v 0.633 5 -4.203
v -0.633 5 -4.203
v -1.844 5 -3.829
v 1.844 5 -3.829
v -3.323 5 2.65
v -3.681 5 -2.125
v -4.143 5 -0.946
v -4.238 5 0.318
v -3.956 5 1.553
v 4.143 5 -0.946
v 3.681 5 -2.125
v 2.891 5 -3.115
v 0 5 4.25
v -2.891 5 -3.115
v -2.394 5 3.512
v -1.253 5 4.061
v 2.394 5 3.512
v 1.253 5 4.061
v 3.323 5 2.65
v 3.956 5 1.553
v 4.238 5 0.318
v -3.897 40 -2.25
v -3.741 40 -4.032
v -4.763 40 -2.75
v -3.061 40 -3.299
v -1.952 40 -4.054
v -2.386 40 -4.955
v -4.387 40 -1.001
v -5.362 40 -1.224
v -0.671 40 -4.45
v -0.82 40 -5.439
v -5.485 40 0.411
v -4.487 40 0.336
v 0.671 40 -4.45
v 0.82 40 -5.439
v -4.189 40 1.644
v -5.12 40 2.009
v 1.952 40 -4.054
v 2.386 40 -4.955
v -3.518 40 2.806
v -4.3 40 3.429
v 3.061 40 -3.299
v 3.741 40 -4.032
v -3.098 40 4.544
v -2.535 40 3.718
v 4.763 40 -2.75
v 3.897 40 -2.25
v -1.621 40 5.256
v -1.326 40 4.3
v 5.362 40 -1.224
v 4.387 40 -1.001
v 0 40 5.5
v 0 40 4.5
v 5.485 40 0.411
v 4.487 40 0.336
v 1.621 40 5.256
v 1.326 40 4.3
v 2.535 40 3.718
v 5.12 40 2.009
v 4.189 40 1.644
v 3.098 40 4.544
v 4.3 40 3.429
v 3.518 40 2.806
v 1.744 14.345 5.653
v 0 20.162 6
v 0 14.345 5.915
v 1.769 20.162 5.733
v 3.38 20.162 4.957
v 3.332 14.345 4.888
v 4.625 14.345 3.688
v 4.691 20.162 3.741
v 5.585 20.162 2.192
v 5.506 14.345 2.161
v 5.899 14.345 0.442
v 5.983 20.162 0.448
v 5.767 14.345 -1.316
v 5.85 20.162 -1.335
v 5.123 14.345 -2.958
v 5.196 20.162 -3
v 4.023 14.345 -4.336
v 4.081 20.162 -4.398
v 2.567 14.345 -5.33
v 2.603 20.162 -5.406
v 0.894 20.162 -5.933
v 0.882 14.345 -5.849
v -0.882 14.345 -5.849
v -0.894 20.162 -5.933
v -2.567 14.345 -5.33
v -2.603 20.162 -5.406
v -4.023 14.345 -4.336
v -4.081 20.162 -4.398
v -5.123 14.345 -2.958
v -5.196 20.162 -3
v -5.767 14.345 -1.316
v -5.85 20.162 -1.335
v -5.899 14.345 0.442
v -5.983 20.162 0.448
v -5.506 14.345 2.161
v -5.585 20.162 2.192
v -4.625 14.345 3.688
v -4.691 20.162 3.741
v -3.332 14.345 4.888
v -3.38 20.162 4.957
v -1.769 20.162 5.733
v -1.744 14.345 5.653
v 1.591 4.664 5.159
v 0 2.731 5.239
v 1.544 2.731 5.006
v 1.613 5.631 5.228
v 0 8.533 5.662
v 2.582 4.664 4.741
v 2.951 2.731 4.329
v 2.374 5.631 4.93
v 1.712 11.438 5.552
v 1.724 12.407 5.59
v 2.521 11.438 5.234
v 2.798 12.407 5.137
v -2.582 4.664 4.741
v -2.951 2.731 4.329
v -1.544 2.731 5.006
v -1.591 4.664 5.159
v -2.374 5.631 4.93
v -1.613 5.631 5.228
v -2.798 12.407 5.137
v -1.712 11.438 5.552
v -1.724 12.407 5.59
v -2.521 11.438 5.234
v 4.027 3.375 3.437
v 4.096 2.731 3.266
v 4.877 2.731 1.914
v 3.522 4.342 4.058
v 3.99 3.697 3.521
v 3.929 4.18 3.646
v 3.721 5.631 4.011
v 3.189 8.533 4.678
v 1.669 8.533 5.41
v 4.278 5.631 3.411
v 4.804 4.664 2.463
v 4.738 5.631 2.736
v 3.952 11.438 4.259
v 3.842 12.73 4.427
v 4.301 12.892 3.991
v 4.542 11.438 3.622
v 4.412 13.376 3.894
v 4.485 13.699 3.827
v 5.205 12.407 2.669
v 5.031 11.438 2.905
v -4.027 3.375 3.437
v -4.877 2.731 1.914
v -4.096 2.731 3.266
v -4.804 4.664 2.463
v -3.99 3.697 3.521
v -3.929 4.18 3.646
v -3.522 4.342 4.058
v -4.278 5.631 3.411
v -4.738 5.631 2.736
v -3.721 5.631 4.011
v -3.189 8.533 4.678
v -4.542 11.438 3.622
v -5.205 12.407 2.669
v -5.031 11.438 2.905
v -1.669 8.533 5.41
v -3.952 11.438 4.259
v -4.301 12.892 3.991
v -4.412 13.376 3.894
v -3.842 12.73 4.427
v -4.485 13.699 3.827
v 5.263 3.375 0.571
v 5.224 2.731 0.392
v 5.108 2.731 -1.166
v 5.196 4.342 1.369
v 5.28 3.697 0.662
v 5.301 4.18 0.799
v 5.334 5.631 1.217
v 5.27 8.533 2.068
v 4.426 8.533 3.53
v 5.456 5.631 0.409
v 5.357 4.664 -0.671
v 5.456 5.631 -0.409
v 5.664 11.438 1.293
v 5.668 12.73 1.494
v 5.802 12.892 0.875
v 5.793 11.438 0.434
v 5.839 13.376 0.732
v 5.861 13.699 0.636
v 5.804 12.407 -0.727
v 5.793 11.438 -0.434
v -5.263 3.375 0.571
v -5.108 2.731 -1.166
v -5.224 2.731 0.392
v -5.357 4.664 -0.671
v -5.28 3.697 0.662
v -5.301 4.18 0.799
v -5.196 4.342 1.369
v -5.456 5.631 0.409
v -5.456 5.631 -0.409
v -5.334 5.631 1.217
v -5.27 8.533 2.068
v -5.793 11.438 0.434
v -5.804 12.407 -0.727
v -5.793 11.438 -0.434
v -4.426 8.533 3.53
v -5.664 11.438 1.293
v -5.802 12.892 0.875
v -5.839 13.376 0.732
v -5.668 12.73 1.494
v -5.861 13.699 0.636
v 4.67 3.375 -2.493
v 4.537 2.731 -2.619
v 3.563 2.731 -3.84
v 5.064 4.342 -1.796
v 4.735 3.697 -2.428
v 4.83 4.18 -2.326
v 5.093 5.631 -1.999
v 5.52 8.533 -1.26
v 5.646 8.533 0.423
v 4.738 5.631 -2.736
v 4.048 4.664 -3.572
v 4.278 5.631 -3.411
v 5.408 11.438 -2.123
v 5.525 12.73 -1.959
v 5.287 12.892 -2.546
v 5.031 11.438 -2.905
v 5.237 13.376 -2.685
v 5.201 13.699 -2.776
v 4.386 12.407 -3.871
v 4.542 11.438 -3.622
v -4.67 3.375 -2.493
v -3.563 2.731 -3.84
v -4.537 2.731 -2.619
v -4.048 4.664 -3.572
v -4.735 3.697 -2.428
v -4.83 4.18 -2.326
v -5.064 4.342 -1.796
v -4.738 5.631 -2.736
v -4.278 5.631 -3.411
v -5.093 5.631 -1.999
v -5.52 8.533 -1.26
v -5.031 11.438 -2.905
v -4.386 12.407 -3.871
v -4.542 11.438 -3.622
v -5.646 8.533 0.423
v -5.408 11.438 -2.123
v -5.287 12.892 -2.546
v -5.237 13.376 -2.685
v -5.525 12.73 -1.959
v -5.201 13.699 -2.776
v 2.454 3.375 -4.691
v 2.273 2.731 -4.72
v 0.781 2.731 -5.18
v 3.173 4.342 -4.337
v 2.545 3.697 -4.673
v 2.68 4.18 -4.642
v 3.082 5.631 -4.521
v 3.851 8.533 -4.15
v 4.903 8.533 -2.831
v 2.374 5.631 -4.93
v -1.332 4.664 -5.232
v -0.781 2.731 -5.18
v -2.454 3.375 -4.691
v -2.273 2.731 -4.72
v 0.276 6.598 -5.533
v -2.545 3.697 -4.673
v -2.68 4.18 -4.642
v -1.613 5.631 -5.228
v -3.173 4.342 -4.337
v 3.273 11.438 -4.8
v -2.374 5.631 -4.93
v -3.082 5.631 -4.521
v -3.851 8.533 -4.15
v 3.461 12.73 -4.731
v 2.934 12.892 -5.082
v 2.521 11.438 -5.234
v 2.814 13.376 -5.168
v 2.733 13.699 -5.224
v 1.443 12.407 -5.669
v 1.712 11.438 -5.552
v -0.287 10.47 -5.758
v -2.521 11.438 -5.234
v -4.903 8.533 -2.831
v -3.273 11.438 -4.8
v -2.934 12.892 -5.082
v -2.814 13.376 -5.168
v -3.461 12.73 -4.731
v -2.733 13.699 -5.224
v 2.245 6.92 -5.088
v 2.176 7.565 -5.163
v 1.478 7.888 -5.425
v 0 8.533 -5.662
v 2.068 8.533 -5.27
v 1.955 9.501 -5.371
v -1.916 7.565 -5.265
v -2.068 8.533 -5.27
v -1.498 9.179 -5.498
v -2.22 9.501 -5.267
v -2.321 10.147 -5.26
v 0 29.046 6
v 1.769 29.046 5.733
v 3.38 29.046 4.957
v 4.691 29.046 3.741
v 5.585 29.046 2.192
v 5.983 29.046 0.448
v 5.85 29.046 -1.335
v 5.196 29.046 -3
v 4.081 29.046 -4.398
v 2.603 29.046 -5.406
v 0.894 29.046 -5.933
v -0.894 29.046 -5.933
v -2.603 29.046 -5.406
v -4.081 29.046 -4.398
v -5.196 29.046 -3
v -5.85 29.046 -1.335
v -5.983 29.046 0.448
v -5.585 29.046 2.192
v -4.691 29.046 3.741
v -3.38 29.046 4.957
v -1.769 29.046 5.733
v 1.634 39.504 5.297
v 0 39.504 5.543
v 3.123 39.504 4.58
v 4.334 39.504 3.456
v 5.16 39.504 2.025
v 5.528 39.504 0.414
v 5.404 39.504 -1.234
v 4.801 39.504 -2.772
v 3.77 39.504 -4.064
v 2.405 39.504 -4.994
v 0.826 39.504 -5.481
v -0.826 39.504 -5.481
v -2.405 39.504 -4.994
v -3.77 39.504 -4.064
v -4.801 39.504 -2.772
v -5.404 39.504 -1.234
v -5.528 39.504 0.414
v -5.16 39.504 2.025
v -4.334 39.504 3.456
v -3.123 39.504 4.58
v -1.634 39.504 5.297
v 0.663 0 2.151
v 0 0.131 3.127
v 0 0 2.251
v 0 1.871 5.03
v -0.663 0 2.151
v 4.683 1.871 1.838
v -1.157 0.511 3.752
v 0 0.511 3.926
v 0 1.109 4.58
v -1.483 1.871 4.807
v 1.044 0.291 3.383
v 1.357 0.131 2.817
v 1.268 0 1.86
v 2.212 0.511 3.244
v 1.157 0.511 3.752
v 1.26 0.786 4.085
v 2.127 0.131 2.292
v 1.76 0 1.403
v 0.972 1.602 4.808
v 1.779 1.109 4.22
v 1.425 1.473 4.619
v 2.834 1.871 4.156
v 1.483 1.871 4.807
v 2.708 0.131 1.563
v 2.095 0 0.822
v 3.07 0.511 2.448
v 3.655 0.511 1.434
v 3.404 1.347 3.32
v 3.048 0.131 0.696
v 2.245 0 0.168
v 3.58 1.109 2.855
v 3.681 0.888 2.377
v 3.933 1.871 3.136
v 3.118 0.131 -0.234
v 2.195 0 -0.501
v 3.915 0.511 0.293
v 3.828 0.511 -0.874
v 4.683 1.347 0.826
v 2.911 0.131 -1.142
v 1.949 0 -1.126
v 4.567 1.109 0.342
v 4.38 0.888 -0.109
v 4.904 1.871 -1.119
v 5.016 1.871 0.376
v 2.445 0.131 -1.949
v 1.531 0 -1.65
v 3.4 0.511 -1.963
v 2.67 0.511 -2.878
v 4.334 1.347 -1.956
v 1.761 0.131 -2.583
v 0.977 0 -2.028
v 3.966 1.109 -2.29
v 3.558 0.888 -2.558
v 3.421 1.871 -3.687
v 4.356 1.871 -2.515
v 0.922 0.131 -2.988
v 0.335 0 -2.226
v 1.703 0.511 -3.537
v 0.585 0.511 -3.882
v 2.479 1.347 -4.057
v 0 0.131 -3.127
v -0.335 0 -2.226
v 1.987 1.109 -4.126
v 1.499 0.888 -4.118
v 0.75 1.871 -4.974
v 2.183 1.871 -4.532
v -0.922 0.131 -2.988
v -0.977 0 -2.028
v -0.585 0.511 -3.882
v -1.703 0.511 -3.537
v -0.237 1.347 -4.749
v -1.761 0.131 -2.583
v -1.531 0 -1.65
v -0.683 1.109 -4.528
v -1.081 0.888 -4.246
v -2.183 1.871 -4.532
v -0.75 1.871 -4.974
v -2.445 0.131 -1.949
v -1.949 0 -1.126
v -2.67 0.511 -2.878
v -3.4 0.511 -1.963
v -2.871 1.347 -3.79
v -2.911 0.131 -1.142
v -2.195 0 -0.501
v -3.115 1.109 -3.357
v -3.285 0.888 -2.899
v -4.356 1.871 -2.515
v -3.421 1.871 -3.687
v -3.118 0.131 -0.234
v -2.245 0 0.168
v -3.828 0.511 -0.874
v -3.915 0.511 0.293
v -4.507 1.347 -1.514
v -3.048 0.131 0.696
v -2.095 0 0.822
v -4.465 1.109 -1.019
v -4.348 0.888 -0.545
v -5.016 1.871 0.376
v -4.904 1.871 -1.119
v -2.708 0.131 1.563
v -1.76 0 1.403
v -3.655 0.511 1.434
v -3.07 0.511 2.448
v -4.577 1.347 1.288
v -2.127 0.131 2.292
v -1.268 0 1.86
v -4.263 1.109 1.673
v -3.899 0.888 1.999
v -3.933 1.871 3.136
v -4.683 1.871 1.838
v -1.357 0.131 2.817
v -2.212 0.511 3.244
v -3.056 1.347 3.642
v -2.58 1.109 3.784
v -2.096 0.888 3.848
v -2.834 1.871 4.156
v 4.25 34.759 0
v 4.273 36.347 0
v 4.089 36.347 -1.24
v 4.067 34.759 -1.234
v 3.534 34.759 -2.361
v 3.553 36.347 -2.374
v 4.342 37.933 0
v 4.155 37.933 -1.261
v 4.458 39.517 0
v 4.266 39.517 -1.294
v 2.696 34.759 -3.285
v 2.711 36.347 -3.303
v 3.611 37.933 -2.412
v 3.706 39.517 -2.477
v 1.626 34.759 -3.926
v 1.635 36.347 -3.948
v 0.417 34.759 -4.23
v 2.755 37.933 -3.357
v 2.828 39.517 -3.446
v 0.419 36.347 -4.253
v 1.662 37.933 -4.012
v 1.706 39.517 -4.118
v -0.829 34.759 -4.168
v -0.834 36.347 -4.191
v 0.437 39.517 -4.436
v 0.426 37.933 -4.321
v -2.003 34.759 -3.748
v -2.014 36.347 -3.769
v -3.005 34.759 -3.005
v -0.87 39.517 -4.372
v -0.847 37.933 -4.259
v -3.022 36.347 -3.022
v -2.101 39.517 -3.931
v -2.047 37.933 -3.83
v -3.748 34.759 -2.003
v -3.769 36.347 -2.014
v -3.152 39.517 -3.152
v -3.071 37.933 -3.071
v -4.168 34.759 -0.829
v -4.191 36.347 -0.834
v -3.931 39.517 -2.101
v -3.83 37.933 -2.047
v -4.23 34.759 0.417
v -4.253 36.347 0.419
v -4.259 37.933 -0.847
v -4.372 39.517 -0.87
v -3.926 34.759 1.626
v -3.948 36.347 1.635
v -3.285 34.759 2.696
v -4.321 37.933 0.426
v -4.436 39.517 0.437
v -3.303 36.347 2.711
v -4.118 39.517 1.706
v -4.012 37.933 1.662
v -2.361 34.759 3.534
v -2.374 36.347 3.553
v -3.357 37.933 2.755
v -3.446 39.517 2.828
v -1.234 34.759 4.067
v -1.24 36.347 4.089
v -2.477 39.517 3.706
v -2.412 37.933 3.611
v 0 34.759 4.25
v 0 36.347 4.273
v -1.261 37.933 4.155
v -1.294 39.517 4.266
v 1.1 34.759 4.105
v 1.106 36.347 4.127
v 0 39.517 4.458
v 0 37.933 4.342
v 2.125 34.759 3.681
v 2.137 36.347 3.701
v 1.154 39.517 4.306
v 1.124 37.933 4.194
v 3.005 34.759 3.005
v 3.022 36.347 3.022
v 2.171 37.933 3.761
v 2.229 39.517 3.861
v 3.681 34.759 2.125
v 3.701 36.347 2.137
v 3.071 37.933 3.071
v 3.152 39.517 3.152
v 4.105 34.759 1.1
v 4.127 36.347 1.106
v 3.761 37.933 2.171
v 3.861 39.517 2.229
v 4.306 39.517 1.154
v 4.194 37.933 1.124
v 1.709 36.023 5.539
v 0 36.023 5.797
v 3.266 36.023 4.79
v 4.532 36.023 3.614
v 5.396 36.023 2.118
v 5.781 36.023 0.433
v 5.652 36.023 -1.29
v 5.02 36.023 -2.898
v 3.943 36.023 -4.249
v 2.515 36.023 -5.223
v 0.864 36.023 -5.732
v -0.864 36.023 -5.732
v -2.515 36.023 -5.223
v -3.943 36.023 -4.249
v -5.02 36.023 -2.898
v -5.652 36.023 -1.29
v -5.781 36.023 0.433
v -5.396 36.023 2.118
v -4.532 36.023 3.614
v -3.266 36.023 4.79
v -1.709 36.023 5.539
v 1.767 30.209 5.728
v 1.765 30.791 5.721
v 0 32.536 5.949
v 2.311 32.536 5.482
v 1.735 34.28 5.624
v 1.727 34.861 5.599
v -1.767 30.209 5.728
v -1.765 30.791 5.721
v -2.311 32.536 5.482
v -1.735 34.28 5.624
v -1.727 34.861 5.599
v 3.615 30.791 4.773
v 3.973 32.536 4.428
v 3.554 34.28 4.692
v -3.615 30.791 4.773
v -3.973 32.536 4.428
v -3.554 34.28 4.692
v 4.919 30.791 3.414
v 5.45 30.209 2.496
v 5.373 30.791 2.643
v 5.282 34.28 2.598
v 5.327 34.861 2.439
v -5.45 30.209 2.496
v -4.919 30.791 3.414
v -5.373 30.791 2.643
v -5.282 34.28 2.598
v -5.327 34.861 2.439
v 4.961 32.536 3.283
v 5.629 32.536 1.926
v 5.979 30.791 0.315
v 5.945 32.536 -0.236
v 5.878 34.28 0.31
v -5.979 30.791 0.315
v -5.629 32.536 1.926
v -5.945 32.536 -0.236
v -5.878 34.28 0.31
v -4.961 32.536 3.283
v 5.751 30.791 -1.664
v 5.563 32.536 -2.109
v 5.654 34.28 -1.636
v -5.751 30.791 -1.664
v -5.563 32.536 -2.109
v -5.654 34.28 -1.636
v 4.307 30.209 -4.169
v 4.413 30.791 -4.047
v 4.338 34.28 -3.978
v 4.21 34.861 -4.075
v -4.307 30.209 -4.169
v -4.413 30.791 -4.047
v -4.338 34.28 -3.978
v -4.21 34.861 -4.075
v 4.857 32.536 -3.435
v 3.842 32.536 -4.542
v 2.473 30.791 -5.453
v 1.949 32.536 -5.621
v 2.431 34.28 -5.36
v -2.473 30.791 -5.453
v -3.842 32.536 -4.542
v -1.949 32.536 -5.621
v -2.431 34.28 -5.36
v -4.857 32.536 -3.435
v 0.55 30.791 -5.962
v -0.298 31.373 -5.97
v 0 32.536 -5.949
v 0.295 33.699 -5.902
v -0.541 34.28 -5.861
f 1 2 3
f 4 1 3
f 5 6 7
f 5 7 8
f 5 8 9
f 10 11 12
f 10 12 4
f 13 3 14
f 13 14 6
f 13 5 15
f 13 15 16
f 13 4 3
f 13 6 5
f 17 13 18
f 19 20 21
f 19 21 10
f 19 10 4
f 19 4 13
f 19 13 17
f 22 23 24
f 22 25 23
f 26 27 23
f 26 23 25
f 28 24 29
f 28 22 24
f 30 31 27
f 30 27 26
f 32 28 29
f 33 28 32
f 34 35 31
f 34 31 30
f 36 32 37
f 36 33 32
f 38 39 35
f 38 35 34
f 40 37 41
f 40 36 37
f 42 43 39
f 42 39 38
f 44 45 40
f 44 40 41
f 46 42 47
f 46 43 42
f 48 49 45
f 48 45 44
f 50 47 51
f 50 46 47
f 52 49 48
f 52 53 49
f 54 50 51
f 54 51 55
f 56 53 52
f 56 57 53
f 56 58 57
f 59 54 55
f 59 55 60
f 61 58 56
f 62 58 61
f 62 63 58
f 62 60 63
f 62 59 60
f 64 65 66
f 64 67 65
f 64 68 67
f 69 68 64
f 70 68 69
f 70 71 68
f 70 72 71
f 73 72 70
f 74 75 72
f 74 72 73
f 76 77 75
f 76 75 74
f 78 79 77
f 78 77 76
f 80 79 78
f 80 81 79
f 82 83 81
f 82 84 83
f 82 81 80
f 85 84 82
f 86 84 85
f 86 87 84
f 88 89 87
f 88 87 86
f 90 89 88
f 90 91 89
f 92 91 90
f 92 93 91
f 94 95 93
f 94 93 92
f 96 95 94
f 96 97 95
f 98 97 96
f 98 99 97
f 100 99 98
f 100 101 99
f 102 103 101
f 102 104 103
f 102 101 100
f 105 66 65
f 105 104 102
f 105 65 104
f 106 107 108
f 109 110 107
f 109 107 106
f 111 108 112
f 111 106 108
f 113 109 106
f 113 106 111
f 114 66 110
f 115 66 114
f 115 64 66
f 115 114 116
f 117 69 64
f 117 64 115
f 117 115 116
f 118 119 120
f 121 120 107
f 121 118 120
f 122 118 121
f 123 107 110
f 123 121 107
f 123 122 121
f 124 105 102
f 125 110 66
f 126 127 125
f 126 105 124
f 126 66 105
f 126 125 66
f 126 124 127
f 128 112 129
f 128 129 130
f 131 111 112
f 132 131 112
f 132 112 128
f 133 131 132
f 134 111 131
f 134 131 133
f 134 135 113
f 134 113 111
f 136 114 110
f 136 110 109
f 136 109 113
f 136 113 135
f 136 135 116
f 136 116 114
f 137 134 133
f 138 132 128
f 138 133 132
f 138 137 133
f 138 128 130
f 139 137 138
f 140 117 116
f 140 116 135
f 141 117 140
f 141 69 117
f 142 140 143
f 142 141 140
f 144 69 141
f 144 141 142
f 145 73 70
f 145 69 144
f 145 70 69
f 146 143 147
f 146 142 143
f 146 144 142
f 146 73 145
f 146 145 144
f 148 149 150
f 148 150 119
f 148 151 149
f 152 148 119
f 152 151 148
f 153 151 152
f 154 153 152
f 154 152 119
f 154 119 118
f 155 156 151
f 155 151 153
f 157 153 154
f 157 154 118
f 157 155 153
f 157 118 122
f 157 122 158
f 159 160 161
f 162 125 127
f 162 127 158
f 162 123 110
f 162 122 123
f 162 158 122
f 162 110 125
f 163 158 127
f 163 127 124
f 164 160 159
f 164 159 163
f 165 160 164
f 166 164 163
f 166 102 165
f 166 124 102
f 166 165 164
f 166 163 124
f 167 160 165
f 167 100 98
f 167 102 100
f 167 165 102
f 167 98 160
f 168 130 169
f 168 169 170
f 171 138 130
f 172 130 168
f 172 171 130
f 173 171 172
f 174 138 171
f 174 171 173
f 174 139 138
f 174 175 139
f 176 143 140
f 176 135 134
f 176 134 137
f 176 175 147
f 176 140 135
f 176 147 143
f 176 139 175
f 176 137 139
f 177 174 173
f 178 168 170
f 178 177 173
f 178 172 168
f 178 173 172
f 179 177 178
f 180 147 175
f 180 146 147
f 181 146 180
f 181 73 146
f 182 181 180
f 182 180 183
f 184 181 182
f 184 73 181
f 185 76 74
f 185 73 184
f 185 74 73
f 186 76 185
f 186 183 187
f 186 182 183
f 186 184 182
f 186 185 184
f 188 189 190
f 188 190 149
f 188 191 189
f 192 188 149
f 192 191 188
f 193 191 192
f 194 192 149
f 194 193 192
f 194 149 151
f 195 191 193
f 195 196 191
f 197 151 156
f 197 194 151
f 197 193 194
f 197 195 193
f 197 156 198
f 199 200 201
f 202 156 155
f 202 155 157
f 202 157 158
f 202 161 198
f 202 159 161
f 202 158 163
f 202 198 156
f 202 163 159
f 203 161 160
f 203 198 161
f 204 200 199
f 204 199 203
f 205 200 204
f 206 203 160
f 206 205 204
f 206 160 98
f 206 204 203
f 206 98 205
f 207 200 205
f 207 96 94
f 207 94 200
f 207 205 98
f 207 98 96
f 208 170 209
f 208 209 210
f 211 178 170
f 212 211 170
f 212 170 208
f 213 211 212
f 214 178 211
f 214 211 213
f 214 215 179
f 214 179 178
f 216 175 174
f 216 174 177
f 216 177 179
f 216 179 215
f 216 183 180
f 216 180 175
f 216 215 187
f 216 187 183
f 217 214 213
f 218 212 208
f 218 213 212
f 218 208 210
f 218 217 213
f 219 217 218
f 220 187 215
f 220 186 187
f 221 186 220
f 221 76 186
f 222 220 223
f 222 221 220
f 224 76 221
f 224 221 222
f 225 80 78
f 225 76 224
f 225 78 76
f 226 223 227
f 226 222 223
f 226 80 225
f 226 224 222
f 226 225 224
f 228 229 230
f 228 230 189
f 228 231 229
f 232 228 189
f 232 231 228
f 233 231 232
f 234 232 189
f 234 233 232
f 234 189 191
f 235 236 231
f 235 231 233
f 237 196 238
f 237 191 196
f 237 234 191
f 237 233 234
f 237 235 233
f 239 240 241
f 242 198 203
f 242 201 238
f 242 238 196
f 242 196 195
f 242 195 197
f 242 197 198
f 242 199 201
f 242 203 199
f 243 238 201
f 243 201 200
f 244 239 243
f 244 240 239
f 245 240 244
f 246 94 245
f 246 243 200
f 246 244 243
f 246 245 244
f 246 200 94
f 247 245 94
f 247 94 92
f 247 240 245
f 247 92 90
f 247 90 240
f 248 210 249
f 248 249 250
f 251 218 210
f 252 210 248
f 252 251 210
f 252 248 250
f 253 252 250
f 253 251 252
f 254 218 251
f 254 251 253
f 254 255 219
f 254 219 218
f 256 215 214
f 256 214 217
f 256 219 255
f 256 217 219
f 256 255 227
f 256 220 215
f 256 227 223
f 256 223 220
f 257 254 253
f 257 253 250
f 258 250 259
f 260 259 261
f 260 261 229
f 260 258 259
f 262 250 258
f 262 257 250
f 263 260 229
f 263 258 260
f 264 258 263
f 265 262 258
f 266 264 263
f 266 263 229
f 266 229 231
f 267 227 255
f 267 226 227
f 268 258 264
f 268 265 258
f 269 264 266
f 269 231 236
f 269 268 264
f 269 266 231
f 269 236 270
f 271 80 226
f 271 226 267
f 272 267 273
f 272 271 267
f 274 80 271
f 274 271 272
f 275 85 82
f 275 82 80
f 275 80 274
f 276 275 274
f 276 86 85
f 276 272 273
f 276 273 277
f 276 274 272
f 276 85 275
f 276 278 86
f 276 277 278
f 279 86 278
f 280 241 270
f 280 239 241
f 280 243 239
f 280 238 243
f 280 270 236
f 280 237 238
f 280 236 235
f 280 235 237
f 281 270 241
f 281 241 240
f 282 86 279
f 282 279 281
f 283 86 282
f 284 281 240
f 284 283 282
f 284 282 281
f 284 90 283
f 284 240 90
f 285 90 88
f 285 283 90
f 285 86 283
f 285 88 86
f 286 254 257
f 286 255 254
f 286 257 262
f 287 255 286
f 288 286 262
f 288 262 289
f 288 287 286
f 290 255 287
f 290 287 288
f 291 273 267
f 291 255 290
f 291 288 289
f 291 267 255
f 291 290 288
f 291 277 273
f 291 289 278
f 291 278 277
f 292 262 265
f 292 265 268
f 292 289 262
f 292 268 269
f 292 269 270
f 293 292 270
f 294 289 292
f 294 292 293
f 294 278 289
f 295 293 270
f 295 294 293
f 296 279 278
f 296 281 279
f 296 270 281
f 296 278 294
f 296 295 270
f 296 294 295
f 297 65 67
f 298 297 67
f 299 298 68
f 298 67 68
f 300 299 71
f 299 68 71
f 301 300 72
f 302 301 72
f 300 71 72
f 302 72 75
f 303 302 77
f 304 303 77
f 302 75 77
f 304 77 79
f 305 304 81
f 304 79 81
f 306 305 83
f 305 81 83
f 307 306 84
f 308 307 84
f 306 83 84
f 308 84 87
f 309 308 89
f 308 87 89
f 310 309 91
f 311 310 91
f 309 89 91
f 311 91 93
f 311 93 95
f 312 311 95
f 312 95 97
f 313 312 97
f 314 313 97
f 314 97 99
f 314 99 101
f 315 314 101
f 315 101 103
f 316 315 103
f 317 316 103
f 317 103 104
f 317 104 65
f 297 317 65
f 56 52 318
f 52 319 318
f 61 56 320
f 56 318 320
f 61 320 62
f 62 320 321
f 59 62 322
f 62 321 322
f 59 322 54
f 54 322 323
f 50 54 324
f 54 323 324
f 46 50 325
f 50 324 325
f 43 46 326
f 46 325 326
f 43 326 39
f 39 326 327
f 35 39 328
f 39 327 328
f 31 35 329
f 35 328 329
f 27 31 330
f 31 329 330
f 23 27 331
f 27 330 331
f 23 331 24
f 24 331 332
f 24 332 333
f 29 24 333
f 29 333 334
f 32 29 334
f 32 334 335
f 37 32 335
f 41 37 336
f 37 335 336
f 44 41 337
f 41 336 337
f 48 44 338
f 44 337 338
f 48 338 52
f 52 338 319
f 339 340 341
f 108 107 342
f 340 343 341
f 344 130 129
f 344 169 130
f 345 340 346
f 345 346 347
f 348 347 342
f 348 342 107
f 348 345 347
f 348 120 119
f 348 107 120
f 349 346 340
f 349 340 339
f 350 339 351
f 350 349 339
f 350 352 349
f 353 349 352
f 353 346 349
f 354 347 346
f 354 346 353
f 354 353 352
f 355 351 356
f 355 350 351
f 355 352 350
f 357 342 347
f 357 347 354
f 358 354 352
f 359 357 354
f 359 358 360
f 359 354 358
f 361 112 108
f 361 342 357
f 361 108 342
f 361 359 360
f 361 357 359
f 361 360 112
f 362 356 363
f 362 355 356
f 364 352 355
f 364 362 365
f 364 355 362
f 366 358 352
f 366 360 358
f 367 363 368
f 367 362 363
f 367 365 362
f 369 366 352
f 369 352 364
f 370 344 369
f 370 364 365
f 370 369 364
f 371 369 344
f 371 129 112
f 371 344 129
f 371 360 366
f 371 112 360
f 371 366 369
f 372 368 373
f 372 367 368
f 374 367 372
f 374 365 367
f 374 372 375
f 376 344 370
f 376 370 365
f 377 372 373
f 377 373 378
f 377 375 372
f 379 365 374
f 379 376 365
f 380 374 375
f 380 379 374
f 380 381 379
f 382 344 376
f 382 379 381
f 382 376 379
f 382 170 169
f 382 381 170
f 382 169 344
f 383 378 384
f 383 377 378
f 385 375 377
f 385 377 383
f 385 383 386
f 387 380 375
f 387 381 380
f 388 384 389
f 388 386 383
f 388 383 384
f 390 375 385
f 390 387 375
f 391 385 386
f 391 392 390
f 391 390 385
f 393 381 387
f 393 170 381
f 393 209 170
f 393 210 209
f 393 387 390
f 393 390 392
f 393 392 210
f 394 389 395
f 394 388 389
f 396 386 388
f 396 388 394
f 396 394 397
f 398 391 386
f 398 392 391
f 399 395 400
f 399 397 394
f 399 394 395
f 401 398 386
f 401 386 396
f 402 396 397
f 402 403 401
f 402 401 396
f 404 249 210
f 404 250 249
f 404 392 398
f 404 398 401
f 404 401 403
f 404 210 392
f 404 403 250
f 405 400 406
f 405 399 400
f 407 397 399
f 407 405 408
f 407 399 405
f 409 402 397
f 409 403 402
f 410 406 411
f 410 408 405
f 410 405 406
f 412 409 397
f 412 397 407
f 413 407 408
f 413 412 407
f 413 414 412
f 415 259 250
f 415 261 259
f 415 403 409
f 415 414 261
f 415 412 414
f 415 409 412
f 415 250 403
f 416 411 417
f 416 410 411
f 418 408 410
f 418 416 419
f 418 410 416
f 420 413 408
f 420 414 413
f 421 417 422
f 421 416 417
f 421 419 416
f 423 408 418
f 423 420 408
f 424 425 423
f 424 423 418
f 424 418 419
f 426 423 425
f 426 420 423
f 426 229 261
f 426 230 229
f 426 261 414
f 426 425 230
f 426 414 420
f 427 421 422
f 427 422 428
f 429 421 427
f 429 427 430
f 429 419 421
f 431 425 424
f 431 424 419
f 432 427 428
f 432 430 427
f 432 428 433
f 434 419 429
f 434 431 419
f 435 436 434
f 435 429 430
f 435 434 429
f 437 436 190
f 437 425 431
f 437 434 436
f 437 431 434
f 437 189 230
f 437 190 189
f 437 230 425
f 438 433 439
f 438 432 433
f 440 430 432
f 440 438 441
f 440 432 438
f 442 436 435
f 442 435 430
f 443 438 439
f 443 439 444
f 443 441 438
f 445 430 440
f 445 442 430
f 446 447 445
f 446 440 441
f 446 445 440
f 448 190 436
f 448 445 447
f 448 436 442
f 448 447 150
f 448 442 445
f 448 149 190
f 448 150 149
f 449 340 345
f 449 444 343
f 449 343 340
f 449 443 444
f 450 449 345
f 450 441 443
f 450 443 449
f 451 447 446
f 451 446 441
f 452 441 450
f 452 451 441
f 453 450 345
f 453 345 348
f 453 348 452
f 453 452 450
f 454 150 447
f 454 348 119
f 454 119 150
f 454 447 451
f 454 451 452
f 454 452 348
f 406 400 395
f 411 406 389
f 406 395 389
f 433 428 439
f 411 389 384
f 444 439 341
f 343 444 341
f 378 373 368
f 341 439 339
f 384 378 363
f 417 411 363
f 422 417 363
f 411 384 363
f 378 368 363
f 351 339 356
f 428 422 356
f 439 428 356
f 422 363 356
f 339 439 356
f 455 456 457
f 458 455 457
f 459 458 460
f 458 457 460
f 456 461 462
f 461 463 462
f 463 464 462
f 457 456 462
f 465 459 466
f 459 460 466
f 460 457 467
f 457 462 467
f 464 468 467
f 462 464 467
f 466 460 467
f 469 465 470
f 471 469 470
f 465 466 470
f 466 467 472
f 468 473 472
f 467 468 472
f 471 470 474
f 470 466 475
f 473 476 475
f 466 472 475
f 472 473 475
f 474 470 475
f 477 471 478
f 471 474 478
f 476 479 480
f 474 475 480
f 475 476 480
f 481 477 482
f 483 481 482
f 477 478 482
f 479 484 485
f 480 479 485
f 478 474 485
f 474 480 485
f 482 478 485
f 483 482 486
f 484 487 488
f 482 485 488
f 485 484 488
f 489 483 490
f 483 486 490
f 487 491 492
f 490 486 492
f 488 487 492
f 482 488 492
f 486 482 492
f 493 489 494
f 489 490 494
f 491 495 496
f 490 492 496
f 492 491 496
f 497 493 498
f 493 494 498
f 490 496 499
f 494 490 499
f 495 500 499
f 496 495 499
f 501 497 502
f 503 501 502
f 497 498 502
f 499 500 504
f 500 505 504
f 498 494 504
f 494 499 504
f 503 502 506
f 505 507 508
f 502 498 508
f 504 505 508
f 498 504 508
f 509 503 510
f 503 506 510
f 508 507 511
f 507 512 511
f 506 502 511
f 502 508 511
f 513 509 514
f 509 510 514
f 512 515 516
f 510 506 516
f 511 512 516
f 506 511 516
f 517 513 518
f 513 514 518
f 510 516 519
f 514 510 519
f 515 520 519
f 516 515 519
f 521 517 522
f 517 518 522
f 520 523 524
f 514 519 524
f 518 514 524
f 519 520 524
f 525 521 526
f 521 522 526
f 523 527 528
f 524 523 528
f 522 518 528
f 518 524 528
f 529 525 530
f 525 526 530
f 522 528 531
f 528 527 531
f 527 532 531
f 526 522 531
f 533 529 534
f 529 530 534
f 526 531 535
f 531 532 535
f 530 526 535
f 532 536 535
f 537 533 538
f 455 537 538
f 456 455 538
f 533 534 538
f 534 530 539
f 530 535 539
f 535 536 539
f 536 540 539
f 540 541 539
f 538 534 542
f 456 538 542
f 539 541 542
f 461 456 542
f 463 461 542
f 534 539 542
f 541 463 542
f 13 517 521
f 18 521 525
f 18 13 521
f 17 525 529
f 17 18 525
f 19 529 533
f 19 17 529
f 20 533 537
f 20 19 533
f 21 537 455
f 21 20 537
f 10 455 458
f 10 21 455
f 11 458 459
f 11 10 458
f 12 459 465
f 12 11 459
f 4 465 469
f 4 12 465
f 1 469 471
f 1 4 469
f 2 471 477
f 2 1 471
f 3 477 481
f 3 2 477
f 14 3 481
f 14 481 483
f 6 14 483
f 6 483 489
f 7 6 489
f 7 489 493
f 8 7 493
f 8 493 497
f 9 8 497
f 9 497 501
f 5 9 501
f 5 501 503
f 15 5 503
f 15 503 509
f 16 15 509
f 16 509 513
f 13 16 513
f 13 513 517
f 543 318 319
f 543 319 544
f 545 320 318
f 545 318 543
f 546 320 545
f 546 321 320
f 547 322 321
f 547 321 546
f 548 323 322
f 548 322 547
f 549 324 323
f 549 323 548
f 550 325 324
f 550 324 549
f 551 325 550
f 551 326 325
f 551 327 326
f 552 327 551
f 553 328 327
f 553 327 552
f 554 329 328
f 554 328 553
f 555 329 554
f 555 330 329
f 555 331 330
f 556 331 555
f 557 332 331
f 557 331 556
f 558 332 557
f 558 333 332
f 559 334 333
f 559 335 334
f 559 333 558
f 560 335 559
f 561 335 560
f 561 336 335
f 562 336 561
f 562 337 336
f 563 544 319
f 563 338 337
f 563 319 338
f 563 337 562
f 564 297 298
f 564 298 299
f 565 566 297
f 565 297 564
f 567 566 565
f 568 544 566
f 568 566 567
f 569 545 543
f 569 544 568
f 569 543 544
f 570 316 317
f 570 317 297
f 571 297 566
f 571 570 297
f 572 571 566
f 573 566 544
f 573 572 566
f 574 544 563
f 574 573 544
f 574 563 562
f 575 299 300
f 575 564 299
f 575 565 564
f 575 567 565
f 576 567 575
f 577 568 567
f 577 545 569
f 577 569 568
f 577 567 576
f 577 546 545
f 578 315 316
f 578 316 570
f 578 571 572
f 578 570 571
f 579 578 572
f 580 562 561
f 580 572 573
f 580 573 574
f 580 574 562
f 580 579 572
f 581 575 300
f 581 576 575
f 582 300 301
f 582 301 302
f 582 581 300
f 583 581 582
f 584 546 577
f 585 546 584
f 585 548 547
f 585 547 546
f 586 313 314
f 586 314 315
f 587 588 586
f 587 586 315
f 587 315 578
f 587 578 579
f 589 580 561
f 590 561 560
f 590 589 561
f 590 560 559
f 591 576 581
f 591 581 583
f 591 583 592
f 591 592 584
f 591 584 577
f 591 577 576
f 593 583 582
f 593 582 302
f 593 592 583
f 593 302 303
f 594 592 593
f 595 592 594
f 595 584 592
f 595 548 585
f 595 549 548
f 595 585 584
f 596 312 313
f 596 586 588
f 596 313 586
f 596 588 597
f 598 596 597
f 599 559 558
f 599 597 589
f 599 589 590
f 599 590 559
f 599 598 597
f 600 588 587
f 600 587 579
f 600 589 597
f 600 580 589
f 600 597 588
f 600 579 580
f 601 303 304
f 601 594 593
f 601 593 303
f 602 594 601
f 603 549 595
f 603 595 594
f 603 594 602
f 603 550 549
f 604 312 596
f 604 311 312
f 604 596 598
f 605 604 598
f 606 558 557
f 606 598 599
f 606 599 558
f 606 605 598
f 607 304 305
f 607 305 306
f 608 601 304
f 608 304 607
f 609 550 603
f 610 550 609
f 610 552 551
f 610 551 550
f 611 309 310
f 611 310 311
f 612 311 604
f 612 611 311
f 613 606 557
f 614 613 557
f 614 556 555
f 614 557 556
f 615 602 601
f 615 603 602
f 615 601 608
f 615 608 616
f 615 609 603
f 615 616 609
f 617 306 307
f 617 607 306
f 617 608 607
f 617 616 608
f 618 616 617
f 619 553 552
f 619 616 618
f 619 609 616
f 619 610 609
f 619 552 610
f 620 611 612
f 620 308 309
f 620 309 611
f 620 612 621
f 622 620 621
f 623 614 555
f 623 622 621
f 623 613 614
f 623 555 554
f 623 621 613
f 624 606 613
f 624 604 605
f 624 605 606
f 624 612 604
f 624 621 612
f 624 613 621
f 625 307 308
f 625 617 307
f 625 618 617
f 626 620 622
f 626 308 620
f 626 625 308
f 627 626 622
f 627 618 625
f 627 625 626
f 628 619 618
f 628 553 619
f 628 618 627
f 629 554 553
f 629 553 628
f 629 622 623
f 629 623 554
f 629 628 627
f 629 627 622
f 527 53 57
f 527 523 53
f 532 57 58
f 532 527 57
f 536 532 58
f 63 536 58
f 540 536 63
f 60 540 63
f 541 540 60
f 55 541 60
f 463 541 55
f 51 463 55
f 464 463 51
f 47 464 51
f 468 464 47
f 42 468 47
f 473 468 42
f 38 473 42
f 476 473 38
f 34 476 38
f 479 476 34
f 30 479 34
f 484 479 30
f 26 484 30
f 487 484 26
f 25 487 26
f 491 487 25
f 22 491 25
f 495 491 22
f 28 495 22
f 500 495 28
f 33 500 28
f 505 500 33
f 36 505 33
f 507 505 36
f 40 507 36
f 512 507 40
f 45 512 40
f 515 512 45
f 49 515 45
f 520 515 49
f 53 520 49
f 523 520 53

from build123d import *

# Parameters (mm, degrees)
SKETCH1_R           = 6
BOSS_EXTRUDE1_DEPTH = 5
SKETCH2_R           = 6
SKETCH2_R_2         = 4.25
BOSS_EXTRUDE2_DEPTH = 35
CHAMFER1_SIZE       = 1
CHAMFER1_SIZE2      = 11.430052303
FILLET1_R           = 200
CHAMFER2_SIZE       = 0.25
CHAMFER2_SIZE2      = 2.857513076
CHAMFER3_SIZE       = 0.5
CHAMFER3_SIZE2      = 5.715026151
FILLET3_R           = 120
FILLET4_R           = 3


with BuildPart() as part:
    # Sketch1 → Boss-Extrude1 (new body)
    with BuildSketch(Plane(origin=(0, 0, 0), x_dir=(1, 0, 0), z_dir=(0, 1, 0))):
        with Locations(Location((0, 0, 0), (0, 0, 270))):
            Circle(SKETCH1_R)
    extrude(amount=BOSS_EXTRUDE1_DEPTH)

    # Sketch2 → Boss-Extrude2 (add)
    with BuildSketch(Plane(origin=(0, 5, 0), x_dir=(1, 0, 0), z_dir=(0, 1, 0))):
        with Locations(Location((0, 0, 0), (0, 0, 270))):
            Circle(SKETCH2_R)
        with Locations(Location((0, 0, 0), (0, 0, 270))):
            Circle(SKETCH2_R_2, mode=Mode.SUBTRACT)
    extrude(amount=BOSS_EXTRUDE2_DEPTH)

    # Chamfer1
    chamfer1_edges = [part.edges().sort_by_distance(p)[0] for p in [
        (0, 0, -6),
    ]]
    chamfer1_side = [part.faces().sort_by_distance(p)[0] for p in [
        (0, 0, 0),
    ]]
    chamfer(chamfer1_edges, length=CHAMFER1_SIZE, length2=CHAMFER1_SIZE2, reference=chamfer1_side[0])

    # Fillet1
    # the kernel refuses this fillet: 200 mm, written as the material it takes off along each edge
    with BuildSketch(Plane(origin=(0, 11.430052303, 0), x_dir=(0, 0, 1), z_dir=(-1, 0, 0))) as fillet1_piece_1:
        with BuildLine():
            CenterArc((6 - FILLET1_R, FILLET1_R * 0.0436609429085), FILLET1_R, 355, 5)
            Line((6 - FILLET1_R * 0.00380530190825, -FILLET1_R * 0.0434947998391), (6, 0))
            Line((6, 0), (6, FILLET1_R * 0.0436609429085))
        make_face()
    revolve(axis=Axis((0, 11.430052303, 0), (0, 1, 0)), mode=Mode.SUBTRACT)

    # Chamfer2
    chamfer2_edges = [part.edges().sort_by_distance(p)[0] for p in [
        (0, 40, -4.25),
    ]]
    chamfer2_side = [part.faces().sort_by_distance(p)[0] for p in [
        (0, 40, -5.830294373),
    ]]
    chamfer(chamfer2_edges, length=CHAMFER2_SIZE, length2=CHAMFER2_SIZE2, reference=chamfer2_side[0])

    # Fillet2: read off the stored shape, not the designer's step
    # Fillet2 outline → Fillet2 (revolve, cut)
    with BuildSketch(Plane.XY):
        with BuildLine():
            Line((4.25, 39.517302996), (4.25, 34.758599442))
            ThreePointArc((4.25, 34.758599442), (4.301967102, 37.140217992), (4.457769484, 39.517302996))
            Line((4.457769484, 39.517302996), (4.25, 39.517302996))
        make_face()
    revolve(axis=Axis((0, 0, 0), (0, 1, 0)), mode=Mode.SUBTRACT)

    # Chamfer3
    chamfer3_edges = [part.edges().sort_by_distance(p)[0] for p in [
        (0, 40, -6),
    ]]
    chamfer3_side = [part.faces().sort_by_distance(p)[0] for p in [
        (0, 40, -4.669705627),
    ]]
    chamfer(chamfer3_edges, length=CHAMFER3_SIZE, length2=CHAMFER3_SIZE2, reference=chamfer3_side[0])

    # Fillet3
    # the kernel refuses this fillet: 120 mm, written as the material it takes off along each edge
    with BuildSketch(Plane(origin=(0, 34.284973849, 0), x_dir=(0, 0, 1), z_dir=(-1, 0, 0))) as fillet3_piece_1:
        with BuildLine():
            CenterArc((6 - FILLET3_R, -FILLET3_R * 0.0436609429085), FILLET3_R, 0, 5)
            Line((6, -FILLET3_R * 0.0436609429085), (6, 0))
            Line((6, 0), (6 - FILLET3_R * 0.00380530190825, FILLET3_R * 0.0434947998391))
        make_face()
    revolve(axis=Axis((0, 34.284973849, 0), (0, 1, 0)), mode=Mode.SUBTRACT)

    # Fillet4
    # the kernel refuses this fillet: 3 mm, written as the material it takes off along each edge
    with BuildSketch(Plane(origin=(0, 0, 0), x_dir=(0, 0, 1), z_dir=(-1, 0, 0))) as fillet4_piece_1:
        with BuildLine():
            CenterArc((2.251015813, 3), FILLET4_R, 270, 84.857339632)
            Line((2.251015813, 0), (2.251015813, -0.06))
            Line((2.251015813, -0.06), (5, -0.06))
            Line((5, -0.06), (5.059771682, -0.005229345))
            Line((5.059771682, -0.005229345), (5.298698094, 2.725714182))
            Line((5.298698094, 2.725714182), (5.238939618, 2.731092335))
        make_face()
    revolve(axis=Axis((0, 0, 0), (0, 1, 0)), mode=Mode.SUBTRACT)


solid = part.part
